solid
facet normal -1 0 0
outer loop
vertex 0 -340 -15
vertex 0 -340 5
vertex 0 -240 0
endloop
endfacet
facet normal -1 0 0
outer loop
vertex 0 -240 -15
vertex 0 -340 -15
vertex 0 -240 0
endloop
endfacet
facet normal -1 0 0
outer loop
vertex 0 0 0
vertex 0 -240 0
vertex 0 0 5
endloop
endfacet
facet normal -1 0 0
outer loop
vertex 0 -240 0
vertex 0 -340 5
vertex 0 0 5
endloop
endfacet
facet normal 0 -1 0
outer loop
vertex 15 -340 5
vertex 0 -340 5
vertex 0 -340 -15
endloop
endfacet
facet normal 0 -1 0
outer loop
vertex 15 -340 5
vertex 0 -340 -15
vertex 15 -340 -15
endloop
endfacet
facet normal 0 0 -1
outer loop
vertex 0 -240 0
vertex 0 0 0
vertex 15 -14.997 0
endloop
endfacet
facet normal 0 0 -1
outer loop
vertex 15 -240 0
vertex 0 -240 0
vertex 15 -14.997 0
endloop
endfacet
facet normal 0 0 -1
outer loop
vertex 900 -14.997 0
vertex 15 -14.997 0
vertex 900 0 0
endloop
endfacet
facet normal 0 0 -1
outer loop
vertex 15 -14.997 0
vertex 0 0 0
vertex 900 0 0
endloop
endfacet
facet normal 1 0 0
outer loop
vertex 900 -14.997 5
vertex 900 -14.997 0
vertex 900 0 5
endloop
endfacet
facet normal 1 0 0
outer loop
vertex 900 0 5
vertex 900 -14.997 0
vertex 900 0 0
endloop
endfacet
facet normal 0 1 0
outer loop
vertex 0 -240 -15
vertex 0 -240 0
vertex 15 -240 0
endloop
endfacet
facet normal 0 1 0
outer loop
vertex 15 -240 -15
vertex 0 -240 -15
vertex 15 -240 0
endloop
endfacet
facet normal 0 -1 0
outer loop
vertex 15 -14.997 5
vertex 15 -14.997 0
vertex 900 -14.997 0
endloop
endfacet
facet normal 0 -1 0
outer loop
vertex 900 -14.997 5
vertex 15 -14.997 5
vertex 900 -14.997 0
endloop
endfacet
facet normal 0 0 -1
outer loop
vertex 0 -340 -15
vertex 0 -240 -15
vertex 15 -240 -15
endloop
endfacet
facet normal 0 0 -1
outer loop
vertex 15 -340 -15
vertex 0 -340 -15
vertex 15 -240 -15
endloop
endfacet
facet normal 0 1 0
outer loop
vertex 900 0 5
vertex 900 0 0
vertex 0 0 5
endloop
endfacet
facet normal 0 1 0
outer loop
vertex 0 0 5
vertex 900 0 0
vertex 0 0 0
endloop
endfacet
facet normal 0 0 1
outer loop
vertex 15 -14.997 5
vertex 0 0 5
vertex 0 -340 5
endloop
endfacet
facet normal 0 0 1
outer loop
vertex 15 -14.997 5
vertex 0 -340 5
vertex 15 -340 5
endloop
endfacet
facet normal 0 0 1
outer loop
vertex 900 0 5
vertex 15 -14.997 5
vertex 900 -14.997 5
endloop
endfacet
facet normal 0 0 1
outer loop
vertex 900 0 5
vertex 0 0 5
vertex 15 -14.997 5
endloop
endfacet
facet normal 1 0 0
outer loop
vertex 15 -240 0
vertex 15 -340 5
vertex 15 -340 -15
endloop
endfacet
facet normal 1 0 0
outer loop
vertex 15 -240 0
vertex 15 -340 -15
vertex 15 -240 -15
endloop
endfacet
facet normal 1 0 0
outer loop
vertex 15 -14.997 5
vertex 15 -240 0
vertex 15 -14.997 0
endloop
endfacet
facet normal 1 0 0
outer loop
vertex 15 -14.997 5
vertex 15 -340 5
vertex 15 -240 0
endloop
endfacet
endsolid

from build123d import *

# Parameters (mm, degrees)
BOSS_EXTRUDE1_DEPTH = 5
SKETCH3_W           = 15
SKETCH3_H           = 100
BOSS_EXTRUDE2_DEPTH = 15


with BuildPart() as part:
    # Sketch1 → Boss-Extrude1 (new body)
    with BuildSketch(Plane.XY):
        Polygon((0, 0), (0, -340), (15, -340), (15, -14.996834209), (900, -14.996834209), (900, 0), align=None)
    extrude(amount=BOSS_EXTRUDE1_DEPTH)

    # Sketch3 → Boss-Extrude2 (add)
    with BuildSketch(Plane.XY):
        with Locations((7.5, -290)):
            Rectangle(SKETCH3_W, SKETCH3_H)
    extrude(amount=-BOSS_EXTRUDE2_DEPTH)


solid = part.part
